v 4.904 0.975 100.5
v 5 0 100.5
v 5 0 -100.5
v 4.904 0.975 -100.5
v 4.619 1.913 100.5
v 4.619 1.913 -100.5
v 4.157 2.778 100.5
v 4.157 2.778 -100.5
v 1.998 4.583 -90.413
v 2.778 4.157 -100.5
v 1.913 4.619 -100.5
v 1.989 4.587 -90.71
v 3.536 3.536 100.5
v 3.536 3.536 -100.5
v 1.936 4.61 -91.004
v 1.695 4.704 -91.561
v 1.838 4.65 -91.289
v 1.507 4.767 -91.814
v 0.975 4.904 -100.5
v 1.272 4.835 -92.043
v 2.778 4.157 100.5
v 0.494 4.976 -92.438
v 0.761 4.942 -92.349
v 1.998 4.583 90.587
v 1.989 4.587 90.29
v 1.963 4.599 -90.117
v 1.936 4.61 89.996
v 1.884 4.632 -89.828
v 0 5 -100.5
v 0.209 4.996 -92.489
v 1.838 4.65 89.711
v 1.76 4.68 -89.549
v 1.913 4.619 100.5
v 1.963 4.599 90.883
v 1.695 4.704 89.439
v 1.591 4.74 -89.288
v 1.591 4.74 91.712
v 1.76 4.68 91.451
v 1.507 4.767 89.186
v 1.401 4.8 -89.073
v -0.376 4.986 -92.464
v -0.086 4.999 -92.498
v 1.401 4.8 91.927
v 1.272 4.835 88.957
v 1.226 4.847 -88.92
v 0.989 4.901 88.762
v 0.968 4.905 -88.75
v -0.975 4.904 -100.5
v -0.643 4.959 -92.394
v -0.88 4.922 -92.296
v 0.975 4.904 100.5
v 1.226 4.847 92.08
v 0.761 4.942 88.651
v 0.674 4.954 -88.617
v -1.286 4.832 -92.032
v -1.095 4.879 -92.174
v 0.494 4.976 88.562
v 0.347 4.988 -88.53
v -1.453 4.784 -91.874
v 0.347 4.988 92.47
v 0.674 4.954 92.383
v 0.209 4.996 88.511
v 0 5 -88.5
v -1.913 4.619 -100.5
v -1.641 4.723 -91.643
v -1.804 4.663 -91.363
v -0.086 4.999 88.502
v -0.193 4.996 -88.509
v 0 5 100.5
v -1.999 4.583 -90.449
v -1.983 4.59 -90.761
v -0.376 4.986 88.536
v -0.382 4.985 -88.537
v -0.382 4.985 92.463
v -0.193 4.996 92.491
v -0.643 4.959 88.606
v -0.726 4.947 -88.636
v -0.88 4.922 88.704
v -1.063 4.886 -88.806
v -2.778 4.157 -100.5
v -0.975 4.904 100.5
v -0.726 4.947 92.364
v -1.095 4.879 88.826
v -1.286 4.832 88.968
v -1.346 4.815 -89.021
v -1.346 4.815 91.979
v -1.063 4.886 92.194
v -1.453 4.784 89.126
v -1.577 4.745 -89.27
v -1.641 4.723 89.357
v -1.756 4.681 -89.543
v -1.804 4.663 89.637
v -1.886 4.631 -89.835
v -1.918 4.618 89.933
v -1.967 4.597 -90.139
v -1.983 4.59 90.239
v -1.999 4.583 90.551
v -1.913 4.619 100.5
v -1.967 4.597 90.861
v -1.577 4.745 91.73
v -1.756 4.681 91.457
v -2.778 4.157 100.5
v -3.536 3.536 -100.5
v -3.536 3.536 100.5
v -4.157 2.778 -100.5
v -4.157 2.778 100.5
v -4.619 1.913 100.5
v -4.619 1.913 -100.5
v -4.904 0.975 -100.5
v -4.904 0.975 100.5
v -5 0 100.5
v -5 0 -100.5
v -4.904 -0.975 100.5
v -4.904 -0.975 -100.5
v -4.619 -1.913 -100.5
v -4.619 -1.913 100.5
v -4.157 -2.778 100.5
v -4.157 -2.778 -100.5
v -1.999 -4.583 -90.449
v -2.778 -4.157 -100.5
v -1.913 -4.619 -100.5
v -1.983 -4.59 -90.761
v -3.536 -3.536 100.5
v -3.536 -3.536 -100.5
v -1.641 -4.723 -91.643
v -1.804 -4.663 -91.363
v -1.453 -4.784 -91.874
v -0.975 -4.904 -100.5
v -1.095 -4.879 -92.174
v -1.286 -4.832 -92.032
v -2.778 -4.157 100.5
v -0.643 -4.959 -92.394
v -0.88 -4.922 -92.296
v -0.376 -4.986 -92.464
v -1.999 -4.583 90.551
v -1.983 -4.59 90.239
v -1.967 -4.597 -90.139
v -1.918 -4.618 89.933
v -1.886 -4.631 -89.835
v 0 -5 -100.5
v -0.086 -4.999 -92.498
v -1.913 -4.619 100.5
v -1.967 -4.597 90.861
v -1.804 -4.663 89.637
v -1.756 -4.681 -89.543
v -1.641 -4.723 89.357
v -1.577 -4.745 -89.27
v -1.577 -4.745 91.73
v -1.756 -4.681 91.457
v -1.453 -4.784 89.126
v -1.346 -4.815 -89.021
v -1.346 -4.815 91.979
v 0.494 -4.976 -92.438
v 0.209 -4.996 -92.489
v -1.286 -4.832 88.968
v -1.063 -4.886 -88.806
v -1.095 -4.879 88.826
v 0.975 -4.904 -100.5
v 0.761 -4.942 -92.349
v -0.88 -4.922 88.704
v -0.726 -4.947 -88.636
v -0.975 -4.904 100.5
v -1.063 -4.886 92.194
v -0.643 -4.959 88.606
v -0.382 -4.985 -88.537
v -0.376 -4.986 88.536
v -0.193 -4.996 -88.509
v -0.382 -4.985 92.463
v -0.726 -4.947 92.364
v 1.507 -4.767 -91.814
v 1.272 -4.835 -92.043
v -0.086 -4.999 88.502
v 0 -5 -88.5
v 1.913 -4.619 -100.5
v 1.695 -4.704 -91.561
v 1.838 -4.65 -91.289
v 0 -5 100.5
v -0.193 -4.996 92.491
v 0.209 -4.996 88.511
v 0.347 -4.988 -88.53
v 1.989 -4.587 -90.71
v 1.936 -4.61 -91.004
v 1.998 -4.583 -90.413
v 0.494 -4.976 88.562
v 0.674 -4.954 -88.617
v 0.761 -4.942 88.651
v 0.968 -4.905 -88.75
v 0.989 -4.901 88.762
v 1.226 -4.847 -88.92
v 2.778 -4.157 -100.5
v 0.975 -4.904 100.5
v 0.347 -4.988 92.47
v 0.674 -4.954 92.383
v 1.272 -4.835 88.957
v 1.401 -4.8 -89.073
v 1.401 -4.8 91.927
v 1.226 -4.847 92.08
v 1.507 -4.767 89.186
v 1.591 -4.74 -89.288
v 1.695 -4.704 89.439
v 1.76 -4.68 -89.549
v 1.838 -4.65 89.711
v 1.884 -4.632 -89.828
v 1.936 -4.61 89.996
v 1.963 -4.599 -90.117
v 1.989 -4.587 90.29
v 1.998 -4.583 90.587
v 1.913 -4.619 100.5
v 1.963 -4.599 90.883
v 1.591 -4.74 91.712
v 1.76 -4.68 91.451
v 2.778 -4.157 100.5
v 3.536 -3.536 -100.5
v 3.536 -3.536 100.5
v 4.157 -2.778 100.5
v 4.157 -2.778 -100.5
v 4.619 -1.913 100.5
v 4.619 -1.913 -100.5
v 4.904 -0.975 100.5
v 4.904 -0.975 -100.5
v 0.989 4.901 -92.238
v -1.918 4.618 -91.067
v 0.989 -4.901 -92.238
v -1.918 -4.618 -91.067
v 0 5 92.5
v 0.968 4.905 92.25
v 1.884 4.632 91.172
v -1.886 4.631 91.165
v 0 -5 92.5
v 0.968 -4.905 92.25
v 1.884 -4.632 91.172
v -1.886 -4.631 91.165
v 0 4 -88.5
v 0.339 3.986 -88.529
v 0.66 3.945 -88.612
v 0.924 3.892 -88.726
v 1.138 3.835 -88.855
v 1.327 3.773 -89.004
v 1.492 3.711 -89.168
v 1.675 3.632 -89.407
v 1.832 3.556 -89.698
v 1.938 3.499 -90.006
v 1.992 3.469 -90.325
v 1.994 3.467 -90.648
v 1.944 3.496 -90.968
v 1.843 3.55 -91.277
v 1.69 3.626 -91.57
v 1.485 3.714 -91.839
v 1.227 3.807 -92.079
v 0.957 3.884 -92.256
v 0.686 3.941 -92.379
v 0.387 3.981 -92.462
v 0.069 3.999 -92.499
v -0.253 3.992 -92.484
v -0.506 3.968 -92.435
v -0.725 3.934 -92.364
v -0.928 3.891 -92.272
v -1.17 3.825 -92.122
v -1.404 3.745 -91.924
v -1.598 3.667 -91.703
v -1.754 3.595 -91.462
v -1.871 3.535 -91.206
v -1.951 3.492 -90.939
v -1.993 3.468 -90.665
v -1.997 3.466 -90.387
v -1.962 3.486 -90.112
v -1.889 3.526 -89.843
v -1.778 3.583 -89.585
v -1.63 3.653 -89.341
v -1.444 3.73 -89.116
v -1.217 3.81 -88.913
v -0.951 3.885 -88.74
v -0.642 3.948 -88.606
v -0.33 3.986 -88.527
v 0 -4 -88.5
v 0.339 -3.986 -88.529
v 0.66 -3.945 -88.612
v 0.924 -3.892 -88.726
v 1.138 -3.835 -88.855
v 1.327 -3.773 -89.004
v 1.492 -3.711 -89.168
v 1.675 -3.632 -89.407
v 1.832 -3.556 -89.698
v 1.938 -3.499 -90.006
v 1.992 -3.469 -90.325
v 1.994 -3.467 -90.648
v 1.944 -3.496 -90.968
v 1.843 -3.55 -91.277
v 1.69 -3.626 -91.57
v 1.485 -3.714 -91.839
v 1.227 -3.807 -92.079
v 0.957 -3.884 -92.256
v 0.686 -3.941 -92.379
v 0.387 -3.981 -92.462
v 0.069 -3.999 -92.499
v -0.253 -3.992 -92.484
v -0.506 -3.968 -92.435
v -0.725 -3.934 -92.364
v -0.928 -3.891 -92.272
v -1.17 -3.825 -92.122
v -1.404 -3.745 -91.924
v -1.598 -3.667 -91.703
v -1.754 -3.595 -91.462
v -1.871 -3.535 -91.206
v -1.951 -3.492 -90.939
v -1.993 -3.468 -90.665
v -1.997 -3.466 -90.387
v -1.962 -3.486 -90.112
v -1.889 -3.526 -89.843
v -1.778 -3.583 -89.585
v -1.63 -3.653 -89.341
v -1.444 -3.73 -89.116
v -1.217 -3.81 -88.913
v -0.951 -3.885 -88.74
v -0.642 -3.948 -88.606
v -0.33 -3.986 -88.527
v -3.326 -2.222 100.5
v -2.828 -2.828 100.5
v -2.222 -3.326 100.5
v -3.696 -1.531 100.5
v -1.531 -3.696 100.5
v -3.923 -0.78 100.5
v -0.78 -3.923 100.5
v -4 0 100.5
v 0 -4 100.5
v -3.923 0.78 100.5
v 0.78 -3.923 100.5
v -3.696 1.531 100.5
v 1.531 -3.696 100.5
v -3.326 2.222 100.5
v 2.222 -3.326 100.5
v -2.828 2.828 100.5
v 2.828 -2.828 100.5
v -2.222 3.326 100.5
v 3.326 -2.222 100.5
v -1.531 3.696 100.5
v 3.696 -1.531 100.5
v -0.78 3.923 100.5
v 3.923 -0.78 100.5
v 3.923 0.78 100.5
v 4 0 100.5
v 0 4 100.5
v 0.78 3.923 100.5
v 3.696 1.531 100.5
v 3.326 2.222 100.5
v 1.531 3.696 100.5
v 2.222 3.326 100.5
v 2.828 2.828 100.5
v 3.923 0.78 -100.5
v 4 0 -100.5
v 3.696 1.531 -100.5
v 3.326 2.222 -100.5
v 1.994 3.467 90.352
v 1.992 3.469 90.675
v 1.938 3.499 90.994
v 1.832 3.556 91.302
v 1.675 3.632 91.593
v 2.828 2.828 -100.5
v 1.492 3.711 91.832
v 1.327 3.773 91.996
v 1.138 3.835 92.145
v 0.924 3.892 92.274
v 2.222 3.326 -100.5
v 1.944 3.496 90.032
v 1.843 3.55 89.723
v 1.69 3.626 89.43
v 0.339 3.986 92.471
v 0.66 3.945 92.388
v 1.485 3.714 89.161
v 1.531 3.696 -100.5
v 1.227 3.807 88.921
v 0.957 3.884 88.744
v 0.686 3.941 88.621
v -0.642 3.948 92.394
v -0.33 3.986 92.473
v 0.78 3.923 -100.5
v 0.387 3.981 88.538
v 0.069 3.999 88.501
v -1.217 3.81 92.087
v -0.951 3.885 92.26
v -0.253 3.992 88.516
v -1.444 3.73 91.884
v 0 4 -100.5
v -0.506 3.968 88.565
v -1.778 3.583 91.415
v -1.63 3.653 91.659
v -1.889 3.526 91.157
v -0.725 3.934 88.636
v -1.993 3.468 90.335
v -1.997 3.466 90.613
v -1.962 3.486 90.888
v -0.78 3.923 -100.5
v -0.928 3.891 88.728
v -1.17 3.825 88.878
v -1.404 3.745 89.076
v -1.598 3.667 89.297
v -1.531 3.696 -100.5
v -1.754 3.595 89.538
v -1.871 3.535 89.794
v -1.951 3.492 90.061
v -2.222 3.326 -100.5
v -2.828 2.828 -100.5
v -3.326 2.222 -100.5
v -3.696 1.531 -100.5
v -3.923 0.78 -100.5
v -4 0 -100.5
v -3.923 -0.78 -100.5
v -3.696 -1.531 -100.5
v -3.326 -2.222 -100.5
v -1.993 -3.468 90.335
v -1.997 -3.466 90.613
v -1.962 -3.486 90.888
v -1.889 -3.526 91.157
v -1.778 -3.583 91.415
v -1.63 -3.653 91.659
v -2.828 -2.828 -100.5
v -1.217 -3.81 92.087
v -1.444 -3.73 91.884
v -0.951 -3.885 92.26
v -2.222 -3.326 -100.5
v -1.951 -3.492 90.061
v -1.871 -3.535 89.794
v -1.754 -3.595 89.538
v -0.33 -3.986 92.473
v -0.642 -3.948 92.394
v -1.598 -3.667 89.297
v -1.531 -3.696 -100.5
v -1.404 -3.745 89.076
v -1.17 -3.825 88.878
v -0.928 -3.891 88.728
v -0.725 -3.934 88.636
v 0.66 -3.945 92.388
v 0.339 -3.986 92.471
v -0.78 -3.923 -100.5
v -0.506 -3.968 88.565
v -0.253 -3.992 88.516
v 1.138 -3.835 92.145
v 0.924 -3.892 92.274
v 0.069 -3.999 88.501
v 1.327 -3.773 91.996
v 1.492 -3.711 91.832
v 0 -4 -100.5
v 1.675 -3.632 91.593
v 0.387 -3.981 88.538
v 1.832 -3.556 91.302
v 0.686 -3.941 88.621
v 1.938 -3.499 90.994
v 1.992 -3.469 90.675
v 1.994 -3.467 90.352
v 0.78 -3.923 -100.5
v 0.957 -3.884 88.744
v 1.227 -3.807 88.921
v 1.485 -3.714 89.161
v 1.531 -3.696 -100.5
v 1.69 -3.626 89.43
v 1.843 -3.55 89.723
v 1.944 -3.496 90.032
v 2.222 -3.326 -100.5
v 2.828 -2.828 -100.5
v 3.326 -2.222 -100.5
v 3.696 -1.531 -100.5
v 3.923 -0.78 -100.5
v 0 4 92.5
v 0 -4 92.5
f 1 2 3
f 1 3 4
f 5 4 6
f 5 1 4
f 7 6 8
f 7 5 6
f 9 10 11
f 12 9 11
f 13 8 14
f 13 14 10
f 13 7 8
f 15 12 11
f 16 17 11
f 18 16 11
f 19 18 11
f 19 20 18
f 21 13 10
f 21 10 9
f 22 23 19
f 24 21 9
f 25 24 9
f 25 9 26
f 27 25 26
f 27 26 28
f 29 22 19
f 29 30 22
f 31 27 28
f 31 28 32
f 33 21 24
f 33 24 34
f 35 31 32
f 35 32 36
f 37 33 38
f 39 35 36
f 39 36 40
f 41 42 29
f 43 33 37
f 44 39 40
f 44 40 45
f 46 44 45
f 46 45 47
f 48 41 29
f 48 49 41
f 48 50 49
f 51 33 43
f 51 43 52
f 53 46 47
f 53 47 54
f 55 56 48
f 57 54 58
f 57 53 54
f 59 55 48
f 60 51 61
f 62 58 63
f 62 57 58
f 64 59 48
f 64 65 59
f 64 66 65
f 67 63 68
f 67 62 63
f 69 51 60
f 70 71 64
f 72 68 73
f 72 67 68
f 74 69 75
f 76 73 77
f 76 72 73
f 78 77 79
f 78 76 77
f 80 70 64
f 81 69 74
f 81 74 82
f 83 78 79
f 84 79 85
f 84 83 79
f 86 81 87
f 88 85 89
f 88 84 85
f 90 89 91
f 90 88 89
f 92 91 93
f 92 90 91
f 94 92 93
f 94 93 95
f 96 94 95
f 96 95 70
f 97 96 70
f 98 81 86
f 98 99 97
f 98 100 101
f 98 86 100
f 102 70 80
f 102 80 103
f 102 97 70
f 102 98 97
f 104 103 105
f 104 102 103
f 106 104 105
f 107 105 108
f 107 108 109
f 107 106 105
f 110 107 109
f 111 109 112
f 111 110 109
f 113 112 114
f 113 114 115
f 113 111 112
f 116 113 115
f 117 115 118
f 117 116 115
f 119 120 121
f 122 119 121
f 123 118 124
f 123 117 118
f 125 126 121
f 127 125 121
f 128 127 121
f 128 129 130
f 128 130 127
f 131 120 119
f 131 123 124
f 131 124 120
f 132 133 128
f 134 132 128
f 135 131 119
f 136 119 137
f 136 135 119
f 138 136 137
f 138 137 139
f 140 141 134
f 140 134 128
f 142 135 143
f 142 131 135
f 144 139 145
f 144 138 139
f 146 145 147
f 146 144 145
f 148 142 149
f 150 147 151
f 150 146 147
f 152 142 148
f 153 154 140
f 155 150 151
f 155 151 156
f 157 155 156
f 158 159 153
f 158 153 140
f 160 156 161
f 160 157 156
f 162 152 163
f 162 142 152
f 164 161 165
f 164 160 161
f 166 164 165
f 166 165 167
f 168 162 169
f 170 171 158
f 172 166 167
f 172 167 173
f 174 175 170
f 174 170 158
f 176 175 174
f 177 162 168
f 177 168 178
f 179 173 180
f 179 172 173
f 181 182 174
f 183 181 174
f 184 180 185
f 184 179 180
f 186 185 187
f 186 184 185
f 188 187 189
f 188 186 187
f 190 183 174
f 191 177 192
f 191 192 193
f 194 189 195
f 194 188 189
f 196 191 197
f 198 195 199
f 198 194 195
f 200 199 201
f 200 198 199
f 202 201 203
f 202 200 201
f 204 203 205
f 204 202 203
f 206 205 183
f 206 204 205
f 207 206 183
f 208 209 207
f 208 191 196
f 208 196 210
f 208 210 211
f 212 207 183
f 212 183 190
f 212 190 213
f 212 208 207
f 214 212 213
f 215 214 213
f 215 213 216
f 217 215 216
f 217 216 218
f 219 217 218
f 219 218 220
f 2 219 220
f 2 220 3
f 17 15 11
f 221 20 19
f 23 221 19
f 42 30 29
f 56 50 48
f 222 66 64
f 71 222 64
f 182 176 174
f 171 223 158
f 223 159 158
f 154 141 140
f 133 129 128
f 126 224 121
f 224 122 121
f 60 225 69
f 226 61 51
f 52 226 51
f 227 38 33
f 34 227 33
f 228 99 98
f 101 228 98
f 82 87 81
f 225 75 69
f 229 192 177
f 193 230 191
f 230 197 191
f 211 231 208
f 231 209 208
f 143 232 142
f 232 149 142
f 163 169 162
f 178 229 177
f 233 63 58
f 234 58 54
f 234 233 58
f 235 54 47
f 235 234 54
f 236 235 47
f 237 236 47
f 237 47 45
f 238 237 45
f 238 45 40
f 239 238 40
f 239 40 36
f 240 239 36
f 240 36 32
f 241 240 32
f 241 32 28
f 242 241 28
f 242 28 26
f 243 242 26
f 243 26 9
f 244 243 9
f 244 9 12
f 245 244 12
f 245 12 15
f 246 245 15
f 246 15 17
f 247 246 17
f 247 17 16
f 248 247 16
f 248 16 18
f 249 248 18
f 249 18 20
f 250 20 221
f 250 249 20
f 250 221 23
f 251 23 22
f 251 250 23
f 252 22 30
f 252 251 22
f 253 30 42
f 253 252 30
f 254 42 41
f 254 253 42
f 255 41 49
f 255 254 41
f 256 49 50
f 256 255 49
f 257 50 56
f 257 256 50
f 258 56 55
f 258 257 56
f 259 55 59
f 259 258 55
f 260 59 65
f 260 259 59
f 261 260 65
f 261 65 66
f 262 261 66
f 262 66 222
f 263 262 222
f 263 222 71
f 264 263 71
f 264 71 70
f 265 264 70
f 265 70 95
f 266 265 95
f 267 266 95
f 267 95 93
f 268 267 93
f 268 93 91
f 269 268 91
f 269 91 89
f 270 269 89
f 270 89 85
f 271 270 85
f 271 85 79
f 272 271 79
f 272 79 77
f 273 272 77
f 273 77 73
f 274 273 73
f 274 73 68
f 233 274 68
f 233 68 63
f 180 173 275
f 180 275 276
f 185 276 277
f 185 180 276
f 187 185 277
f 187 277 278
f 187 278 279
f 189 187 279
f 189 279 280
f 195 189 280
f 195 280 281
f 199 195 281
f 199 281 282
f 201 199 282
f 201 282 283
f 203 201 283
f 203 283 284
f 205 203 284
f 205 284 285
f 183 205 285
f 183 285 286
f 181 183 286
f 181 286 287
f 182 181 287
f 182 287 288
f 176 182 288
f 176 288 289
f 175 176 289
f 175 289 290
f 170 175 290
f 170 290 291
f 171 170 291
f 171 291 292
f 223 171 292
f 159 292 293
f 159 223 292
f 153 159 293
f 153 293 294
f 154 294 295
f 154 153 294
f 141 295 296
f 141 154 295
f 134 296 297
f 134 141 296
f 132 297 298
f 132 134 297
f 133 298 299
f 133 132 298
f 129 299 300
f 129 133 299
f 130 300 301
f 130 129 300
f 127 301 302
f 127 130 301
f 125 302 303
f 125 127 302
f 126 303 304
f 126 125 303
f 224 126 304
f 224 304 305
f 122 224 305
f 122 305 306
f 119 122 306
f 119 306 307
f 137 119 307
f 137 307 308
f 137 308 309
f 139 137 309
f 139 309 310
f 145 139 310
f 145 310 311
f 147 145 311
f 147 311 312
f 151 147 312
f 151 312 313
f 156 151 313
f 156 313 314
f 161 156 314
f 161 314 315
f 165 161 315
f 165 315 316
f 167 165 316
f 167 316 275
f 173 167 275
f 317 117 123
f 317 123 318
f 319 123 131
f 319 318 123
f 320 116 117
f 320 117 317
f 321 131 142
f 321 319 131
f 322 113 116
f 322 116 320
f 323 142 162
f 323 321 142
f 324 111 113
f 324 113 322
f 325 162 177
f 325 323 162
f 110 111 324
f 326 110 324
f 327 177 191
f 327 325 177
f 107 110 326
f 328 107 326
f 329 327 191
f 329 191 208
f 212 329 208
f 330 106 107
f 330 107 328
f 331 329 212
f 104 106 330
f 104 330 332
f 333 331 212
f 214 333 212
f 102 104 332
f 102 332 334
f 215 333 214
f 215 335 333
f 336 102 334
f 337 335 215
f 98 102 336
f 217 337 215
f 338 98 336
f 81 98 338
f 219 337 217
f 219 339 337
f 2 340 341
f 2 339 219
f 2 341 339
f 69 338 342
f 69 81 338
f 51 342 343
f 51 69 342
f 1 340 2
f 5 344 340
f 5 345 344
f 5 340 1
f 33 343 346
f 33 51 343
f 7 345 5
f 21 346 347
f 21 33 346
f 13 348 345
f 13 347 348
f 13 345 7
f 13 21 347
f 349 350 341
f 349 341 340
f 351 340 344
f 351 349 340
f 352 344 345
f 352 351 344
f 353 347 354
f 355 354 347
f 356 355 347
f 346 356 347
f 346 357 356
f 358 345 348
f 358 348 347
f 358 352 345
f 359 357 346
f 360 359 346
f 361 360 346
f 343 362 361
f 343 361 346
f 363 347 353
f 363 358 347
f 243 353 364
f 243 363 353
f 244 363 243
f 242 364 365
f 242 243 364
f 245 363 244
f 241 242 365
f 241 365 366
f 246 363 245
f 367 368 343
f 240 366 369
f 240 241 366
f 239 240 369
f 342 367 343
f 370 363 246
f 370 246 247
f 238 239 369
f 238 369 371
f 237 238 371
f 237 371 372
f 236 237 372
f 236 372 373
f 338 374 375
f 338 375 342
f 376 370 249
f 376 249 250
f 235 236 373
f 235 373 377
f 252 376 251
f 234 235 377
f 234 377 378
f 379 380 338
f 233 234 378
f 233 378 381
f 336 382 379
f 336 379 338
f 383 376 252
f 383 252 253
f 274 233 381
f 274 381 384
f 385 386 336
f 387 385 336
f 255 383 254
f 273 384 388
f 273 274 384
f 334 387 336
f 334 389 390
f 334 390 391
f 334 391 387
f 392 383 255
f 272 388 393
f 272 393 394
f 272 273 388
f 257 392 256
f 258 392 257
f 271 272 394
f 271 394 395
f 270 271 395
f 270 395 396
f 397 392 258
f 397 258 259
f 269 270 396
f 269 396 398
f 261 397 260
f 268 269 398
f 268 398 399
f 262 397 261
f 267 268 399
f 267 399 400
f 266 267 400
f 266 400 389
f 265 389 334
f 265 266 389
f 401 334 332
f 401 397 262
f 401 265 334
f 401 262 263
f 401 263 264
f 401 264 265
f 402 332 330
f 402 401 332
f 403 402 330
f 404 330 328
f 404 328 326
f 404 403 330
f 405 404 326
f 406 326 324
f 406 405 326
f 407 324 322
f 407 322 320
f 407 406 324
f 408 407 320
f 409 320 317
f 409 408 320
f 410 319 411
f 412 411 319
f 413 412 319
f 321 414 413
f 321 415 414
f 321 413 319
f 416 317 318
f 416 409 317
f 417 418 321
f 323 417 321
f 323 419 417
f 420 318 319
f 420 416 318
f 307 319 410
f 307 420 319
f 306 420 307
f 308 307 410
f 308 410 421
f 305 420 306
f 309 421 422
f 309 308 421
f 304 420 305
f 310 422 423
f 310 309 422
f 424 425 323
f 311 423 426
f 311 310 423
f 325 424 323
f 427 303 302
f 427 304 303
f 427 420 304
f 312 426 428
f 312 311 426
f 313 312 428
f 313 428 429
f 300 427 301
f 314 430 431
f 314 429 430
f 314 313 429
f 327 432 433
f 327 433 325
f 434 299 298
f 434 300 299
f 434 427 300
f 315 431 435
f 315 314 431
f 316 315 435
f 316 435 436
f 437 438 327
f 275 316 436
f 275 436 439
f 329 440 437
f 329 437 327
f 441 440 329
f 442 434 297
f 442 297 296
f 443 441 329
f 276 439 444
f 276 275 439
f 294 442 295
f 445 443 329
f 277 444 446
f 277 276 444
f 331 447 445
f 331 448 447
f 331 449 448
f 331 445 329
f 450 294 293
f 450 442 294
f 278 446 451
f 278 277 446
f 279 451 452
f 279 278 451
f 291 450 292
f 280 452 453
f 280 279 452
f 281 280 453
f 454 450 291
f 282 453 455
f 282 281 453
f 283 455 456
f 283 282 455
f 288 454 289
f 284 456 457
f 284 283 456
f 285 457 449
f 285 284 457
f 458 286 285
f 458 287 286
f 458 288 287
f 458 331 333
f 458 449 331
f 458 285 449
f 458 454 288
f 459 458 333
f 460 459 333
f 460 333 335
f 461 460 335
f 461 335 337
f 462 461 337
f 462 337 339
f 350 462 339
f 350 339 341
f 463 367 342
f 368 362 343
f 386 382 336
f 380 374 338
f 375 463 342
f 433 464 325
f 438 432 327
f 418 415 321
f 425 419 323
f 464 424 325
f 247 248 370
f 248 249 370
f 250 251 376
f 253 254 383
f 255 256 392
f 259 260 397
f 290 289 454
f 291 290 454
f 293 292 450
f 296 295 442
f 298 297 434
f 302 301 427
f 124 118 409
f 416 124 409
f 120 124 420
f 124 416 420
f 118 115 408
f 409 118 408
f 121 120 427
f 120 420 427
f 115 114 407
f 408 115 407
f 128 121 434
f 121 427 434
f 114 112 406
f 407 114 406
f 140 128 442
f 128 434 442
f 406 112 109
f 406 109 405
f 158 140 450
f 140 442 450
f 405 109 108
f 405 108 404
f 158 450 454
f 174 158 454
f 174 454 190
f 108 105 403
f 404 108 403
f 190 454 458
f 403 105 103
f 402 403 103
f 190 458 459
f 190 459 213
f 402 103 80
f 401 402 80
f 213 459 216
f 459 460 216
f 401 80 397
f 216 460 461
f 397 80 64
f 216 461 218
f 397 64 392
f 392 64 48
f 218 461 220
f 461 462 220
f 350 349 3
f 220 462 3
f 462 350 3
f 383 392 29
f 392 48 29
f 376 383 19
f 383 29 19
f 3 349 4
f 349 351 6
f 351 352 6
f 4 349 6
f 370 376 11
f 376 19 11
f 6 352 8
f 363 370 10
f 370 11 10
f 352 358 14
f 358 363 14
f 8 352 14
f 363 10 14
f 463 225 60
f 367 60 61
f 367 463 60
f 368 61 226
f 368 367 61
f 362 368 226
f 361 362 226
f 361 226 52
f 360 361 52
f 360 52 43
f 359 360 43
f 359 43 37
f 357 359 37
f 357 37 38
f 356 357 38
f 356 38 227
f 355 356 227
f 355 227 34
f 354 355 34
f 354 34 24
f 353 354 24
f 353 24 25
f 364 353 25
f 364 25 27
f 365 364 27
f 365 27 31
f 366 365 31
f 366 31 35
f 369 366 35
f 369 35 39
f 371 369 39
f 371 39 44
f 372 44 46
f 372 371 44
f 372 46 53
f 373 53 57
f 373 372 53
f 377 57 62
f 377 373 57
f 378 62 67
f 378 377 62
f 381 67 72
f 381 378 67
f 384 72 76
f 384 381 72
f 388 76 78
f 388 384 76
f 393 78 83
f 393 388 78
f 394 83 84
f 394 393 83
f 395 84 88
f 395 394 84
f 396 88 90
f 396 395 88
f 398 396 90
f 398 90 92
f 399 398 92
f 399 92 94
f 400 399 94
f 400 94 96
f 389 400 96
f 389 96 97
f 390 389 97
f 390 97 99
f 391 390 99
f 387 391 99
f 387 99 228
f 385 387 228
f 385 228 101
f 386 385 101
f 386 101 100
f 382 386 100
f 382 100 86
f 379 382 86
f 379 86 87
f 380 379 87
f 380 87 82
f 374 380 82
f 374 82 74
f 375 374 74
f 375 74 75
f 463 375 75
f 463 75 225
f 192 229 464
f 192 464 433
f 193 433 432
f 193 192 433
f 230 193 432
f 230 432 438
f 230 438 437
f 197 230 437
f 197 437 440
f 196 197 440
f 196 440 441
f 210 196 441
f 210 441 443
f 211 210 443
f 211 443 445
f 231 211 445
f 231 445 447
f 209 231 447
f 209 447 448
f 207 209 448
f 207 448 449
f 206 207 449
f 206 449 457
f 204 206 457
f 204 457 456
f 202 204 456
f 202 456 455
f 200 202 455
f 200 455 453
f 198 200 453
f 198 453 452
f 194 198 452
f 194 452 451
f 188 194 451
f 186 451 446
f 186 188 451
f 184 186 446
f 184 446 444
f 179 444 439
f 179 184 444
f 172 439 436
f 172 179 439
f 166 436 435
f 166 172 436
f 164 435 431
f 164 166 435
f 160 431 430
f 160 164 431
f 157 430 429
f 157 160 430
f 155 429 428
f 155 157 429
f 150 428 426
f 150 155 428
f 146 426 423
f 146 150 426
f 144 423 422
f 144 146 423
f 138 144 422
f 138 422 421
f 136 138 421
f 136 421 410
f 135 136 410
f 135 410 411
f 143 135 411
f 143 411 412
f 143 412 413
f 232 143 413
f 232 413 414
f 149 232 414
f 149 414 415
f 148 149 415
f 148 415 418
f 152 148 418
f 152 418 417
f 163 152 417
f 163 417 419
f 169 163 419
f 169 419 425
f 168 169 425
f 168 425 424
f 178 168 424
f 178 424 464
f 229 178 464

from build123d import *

# Parameters (mm, degrees)
SKETCH_1_R               = 5
SKETCH_1_R_2             = 4
EXTRUDE_1_DEPTH          = 100.5
CUT_EXTRUDE_1_DEPTH      = 101.74844912
CUT_EXTRUDE_1_DEPTH_BACK = 101.74844912
SKETCH_2_R               = 2


with BuildPart() as part:
    # 草图1 → 凸台-拉伸1 (new, symmetric)
    with BuildSketch(Plane.XY):
        Circle(SKETCH_1_R)
        Circle(SKETCH_1_R_2, mode=Mode.SUBTRACT)
    extrude(amount=EXTRUDE_1_DEPTH, both=True)

    # 草图2 → 切除-拉伸1 (cut, two sides: drawn at the far end of the back side and taken through both)
    with BuildSketch(Plane(origin=(0, 0, 0), x_dir=(1, 0, 0), z_dir=(0, 1, 0)).offset(-CUT_EXTRUDE_1_DEPTH_BACK)):
        with Locations(Location((0, -90.5, 0), (0, 0, 270))):
            Circle(SKETCH_2_R)
        with Locations(Location((0, 90.5, 0), (0, 0, 270))):
            Circle(SKETCH_2_R)
    extrude(amount=CUT_EXTRUDE_1_DEPTH + CUT_EXTRUDE_1_DEPTH_BACK, mode=Mode.SUBTRACT)


solid = part.part
